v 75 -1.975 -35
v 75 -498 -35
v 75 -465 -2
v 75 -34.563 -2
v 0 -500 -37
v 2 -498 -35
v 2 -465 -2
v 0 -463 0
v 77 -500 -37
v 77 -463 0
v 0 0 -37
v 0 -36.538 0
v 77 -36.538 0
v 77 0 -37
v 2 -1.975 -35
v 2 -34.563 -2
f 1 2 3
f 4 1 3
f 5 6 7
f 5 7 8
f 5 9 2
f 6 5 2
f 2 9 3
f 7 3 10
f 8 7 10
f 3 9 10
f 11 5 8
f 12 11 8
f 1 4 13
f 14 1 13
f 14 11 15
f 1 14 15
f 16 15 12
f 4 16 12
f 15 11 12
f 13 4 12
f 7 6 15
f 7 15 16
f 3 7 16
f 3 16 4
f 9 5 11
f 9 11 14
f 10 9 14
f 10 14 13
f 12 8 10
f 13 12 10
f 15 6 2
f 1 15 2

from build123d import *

# Parameters (mm, degrees)
F0_W     = 77
F0_H     = 37
F0_W_2   = 73
F0_H_2   = 33
F1_DEPTH = 500
F3_DEPTH = 128.275266
F5_DEPTH = 87.845365


with BuildPart() as f1:
    # F0 (on Front) → F1 (new body)
    with BuildSketch(Plane.XZ):
        with Locations((38.5, -18.5)):
            Rectangle(F0_W, F0_H)
        with Locations((38.5, -18.5)):
            Rectangle(F0_W_2, F0_H_2, mode=Mode.SUBTRACT)
    extrude(amount=F1_DEPTH)

    # F2 (on face) → F3 (cut)
    with BuildSketch(Plane(origin=(0, 0, 0), x_dir=(0, -1, 0), z_dir=(-1, 0, 0))):
        Polygon((36.537793, 0), (0, 0), (0, -37), align=None)
    extrude(amount=-F3_DEPTH, mode=Mode.SUBTRACT)

    # F4 (on face) → F5 (cut)
    with BuildSketch(Plane.YZ.offset(77)):
        Polygon((-463, 0), (-500, 0), (-500, -37), align=None)
    extrude(amount=-F5_DEPTH, mode=Mode.SUBTRACT)


solid = f1.part
